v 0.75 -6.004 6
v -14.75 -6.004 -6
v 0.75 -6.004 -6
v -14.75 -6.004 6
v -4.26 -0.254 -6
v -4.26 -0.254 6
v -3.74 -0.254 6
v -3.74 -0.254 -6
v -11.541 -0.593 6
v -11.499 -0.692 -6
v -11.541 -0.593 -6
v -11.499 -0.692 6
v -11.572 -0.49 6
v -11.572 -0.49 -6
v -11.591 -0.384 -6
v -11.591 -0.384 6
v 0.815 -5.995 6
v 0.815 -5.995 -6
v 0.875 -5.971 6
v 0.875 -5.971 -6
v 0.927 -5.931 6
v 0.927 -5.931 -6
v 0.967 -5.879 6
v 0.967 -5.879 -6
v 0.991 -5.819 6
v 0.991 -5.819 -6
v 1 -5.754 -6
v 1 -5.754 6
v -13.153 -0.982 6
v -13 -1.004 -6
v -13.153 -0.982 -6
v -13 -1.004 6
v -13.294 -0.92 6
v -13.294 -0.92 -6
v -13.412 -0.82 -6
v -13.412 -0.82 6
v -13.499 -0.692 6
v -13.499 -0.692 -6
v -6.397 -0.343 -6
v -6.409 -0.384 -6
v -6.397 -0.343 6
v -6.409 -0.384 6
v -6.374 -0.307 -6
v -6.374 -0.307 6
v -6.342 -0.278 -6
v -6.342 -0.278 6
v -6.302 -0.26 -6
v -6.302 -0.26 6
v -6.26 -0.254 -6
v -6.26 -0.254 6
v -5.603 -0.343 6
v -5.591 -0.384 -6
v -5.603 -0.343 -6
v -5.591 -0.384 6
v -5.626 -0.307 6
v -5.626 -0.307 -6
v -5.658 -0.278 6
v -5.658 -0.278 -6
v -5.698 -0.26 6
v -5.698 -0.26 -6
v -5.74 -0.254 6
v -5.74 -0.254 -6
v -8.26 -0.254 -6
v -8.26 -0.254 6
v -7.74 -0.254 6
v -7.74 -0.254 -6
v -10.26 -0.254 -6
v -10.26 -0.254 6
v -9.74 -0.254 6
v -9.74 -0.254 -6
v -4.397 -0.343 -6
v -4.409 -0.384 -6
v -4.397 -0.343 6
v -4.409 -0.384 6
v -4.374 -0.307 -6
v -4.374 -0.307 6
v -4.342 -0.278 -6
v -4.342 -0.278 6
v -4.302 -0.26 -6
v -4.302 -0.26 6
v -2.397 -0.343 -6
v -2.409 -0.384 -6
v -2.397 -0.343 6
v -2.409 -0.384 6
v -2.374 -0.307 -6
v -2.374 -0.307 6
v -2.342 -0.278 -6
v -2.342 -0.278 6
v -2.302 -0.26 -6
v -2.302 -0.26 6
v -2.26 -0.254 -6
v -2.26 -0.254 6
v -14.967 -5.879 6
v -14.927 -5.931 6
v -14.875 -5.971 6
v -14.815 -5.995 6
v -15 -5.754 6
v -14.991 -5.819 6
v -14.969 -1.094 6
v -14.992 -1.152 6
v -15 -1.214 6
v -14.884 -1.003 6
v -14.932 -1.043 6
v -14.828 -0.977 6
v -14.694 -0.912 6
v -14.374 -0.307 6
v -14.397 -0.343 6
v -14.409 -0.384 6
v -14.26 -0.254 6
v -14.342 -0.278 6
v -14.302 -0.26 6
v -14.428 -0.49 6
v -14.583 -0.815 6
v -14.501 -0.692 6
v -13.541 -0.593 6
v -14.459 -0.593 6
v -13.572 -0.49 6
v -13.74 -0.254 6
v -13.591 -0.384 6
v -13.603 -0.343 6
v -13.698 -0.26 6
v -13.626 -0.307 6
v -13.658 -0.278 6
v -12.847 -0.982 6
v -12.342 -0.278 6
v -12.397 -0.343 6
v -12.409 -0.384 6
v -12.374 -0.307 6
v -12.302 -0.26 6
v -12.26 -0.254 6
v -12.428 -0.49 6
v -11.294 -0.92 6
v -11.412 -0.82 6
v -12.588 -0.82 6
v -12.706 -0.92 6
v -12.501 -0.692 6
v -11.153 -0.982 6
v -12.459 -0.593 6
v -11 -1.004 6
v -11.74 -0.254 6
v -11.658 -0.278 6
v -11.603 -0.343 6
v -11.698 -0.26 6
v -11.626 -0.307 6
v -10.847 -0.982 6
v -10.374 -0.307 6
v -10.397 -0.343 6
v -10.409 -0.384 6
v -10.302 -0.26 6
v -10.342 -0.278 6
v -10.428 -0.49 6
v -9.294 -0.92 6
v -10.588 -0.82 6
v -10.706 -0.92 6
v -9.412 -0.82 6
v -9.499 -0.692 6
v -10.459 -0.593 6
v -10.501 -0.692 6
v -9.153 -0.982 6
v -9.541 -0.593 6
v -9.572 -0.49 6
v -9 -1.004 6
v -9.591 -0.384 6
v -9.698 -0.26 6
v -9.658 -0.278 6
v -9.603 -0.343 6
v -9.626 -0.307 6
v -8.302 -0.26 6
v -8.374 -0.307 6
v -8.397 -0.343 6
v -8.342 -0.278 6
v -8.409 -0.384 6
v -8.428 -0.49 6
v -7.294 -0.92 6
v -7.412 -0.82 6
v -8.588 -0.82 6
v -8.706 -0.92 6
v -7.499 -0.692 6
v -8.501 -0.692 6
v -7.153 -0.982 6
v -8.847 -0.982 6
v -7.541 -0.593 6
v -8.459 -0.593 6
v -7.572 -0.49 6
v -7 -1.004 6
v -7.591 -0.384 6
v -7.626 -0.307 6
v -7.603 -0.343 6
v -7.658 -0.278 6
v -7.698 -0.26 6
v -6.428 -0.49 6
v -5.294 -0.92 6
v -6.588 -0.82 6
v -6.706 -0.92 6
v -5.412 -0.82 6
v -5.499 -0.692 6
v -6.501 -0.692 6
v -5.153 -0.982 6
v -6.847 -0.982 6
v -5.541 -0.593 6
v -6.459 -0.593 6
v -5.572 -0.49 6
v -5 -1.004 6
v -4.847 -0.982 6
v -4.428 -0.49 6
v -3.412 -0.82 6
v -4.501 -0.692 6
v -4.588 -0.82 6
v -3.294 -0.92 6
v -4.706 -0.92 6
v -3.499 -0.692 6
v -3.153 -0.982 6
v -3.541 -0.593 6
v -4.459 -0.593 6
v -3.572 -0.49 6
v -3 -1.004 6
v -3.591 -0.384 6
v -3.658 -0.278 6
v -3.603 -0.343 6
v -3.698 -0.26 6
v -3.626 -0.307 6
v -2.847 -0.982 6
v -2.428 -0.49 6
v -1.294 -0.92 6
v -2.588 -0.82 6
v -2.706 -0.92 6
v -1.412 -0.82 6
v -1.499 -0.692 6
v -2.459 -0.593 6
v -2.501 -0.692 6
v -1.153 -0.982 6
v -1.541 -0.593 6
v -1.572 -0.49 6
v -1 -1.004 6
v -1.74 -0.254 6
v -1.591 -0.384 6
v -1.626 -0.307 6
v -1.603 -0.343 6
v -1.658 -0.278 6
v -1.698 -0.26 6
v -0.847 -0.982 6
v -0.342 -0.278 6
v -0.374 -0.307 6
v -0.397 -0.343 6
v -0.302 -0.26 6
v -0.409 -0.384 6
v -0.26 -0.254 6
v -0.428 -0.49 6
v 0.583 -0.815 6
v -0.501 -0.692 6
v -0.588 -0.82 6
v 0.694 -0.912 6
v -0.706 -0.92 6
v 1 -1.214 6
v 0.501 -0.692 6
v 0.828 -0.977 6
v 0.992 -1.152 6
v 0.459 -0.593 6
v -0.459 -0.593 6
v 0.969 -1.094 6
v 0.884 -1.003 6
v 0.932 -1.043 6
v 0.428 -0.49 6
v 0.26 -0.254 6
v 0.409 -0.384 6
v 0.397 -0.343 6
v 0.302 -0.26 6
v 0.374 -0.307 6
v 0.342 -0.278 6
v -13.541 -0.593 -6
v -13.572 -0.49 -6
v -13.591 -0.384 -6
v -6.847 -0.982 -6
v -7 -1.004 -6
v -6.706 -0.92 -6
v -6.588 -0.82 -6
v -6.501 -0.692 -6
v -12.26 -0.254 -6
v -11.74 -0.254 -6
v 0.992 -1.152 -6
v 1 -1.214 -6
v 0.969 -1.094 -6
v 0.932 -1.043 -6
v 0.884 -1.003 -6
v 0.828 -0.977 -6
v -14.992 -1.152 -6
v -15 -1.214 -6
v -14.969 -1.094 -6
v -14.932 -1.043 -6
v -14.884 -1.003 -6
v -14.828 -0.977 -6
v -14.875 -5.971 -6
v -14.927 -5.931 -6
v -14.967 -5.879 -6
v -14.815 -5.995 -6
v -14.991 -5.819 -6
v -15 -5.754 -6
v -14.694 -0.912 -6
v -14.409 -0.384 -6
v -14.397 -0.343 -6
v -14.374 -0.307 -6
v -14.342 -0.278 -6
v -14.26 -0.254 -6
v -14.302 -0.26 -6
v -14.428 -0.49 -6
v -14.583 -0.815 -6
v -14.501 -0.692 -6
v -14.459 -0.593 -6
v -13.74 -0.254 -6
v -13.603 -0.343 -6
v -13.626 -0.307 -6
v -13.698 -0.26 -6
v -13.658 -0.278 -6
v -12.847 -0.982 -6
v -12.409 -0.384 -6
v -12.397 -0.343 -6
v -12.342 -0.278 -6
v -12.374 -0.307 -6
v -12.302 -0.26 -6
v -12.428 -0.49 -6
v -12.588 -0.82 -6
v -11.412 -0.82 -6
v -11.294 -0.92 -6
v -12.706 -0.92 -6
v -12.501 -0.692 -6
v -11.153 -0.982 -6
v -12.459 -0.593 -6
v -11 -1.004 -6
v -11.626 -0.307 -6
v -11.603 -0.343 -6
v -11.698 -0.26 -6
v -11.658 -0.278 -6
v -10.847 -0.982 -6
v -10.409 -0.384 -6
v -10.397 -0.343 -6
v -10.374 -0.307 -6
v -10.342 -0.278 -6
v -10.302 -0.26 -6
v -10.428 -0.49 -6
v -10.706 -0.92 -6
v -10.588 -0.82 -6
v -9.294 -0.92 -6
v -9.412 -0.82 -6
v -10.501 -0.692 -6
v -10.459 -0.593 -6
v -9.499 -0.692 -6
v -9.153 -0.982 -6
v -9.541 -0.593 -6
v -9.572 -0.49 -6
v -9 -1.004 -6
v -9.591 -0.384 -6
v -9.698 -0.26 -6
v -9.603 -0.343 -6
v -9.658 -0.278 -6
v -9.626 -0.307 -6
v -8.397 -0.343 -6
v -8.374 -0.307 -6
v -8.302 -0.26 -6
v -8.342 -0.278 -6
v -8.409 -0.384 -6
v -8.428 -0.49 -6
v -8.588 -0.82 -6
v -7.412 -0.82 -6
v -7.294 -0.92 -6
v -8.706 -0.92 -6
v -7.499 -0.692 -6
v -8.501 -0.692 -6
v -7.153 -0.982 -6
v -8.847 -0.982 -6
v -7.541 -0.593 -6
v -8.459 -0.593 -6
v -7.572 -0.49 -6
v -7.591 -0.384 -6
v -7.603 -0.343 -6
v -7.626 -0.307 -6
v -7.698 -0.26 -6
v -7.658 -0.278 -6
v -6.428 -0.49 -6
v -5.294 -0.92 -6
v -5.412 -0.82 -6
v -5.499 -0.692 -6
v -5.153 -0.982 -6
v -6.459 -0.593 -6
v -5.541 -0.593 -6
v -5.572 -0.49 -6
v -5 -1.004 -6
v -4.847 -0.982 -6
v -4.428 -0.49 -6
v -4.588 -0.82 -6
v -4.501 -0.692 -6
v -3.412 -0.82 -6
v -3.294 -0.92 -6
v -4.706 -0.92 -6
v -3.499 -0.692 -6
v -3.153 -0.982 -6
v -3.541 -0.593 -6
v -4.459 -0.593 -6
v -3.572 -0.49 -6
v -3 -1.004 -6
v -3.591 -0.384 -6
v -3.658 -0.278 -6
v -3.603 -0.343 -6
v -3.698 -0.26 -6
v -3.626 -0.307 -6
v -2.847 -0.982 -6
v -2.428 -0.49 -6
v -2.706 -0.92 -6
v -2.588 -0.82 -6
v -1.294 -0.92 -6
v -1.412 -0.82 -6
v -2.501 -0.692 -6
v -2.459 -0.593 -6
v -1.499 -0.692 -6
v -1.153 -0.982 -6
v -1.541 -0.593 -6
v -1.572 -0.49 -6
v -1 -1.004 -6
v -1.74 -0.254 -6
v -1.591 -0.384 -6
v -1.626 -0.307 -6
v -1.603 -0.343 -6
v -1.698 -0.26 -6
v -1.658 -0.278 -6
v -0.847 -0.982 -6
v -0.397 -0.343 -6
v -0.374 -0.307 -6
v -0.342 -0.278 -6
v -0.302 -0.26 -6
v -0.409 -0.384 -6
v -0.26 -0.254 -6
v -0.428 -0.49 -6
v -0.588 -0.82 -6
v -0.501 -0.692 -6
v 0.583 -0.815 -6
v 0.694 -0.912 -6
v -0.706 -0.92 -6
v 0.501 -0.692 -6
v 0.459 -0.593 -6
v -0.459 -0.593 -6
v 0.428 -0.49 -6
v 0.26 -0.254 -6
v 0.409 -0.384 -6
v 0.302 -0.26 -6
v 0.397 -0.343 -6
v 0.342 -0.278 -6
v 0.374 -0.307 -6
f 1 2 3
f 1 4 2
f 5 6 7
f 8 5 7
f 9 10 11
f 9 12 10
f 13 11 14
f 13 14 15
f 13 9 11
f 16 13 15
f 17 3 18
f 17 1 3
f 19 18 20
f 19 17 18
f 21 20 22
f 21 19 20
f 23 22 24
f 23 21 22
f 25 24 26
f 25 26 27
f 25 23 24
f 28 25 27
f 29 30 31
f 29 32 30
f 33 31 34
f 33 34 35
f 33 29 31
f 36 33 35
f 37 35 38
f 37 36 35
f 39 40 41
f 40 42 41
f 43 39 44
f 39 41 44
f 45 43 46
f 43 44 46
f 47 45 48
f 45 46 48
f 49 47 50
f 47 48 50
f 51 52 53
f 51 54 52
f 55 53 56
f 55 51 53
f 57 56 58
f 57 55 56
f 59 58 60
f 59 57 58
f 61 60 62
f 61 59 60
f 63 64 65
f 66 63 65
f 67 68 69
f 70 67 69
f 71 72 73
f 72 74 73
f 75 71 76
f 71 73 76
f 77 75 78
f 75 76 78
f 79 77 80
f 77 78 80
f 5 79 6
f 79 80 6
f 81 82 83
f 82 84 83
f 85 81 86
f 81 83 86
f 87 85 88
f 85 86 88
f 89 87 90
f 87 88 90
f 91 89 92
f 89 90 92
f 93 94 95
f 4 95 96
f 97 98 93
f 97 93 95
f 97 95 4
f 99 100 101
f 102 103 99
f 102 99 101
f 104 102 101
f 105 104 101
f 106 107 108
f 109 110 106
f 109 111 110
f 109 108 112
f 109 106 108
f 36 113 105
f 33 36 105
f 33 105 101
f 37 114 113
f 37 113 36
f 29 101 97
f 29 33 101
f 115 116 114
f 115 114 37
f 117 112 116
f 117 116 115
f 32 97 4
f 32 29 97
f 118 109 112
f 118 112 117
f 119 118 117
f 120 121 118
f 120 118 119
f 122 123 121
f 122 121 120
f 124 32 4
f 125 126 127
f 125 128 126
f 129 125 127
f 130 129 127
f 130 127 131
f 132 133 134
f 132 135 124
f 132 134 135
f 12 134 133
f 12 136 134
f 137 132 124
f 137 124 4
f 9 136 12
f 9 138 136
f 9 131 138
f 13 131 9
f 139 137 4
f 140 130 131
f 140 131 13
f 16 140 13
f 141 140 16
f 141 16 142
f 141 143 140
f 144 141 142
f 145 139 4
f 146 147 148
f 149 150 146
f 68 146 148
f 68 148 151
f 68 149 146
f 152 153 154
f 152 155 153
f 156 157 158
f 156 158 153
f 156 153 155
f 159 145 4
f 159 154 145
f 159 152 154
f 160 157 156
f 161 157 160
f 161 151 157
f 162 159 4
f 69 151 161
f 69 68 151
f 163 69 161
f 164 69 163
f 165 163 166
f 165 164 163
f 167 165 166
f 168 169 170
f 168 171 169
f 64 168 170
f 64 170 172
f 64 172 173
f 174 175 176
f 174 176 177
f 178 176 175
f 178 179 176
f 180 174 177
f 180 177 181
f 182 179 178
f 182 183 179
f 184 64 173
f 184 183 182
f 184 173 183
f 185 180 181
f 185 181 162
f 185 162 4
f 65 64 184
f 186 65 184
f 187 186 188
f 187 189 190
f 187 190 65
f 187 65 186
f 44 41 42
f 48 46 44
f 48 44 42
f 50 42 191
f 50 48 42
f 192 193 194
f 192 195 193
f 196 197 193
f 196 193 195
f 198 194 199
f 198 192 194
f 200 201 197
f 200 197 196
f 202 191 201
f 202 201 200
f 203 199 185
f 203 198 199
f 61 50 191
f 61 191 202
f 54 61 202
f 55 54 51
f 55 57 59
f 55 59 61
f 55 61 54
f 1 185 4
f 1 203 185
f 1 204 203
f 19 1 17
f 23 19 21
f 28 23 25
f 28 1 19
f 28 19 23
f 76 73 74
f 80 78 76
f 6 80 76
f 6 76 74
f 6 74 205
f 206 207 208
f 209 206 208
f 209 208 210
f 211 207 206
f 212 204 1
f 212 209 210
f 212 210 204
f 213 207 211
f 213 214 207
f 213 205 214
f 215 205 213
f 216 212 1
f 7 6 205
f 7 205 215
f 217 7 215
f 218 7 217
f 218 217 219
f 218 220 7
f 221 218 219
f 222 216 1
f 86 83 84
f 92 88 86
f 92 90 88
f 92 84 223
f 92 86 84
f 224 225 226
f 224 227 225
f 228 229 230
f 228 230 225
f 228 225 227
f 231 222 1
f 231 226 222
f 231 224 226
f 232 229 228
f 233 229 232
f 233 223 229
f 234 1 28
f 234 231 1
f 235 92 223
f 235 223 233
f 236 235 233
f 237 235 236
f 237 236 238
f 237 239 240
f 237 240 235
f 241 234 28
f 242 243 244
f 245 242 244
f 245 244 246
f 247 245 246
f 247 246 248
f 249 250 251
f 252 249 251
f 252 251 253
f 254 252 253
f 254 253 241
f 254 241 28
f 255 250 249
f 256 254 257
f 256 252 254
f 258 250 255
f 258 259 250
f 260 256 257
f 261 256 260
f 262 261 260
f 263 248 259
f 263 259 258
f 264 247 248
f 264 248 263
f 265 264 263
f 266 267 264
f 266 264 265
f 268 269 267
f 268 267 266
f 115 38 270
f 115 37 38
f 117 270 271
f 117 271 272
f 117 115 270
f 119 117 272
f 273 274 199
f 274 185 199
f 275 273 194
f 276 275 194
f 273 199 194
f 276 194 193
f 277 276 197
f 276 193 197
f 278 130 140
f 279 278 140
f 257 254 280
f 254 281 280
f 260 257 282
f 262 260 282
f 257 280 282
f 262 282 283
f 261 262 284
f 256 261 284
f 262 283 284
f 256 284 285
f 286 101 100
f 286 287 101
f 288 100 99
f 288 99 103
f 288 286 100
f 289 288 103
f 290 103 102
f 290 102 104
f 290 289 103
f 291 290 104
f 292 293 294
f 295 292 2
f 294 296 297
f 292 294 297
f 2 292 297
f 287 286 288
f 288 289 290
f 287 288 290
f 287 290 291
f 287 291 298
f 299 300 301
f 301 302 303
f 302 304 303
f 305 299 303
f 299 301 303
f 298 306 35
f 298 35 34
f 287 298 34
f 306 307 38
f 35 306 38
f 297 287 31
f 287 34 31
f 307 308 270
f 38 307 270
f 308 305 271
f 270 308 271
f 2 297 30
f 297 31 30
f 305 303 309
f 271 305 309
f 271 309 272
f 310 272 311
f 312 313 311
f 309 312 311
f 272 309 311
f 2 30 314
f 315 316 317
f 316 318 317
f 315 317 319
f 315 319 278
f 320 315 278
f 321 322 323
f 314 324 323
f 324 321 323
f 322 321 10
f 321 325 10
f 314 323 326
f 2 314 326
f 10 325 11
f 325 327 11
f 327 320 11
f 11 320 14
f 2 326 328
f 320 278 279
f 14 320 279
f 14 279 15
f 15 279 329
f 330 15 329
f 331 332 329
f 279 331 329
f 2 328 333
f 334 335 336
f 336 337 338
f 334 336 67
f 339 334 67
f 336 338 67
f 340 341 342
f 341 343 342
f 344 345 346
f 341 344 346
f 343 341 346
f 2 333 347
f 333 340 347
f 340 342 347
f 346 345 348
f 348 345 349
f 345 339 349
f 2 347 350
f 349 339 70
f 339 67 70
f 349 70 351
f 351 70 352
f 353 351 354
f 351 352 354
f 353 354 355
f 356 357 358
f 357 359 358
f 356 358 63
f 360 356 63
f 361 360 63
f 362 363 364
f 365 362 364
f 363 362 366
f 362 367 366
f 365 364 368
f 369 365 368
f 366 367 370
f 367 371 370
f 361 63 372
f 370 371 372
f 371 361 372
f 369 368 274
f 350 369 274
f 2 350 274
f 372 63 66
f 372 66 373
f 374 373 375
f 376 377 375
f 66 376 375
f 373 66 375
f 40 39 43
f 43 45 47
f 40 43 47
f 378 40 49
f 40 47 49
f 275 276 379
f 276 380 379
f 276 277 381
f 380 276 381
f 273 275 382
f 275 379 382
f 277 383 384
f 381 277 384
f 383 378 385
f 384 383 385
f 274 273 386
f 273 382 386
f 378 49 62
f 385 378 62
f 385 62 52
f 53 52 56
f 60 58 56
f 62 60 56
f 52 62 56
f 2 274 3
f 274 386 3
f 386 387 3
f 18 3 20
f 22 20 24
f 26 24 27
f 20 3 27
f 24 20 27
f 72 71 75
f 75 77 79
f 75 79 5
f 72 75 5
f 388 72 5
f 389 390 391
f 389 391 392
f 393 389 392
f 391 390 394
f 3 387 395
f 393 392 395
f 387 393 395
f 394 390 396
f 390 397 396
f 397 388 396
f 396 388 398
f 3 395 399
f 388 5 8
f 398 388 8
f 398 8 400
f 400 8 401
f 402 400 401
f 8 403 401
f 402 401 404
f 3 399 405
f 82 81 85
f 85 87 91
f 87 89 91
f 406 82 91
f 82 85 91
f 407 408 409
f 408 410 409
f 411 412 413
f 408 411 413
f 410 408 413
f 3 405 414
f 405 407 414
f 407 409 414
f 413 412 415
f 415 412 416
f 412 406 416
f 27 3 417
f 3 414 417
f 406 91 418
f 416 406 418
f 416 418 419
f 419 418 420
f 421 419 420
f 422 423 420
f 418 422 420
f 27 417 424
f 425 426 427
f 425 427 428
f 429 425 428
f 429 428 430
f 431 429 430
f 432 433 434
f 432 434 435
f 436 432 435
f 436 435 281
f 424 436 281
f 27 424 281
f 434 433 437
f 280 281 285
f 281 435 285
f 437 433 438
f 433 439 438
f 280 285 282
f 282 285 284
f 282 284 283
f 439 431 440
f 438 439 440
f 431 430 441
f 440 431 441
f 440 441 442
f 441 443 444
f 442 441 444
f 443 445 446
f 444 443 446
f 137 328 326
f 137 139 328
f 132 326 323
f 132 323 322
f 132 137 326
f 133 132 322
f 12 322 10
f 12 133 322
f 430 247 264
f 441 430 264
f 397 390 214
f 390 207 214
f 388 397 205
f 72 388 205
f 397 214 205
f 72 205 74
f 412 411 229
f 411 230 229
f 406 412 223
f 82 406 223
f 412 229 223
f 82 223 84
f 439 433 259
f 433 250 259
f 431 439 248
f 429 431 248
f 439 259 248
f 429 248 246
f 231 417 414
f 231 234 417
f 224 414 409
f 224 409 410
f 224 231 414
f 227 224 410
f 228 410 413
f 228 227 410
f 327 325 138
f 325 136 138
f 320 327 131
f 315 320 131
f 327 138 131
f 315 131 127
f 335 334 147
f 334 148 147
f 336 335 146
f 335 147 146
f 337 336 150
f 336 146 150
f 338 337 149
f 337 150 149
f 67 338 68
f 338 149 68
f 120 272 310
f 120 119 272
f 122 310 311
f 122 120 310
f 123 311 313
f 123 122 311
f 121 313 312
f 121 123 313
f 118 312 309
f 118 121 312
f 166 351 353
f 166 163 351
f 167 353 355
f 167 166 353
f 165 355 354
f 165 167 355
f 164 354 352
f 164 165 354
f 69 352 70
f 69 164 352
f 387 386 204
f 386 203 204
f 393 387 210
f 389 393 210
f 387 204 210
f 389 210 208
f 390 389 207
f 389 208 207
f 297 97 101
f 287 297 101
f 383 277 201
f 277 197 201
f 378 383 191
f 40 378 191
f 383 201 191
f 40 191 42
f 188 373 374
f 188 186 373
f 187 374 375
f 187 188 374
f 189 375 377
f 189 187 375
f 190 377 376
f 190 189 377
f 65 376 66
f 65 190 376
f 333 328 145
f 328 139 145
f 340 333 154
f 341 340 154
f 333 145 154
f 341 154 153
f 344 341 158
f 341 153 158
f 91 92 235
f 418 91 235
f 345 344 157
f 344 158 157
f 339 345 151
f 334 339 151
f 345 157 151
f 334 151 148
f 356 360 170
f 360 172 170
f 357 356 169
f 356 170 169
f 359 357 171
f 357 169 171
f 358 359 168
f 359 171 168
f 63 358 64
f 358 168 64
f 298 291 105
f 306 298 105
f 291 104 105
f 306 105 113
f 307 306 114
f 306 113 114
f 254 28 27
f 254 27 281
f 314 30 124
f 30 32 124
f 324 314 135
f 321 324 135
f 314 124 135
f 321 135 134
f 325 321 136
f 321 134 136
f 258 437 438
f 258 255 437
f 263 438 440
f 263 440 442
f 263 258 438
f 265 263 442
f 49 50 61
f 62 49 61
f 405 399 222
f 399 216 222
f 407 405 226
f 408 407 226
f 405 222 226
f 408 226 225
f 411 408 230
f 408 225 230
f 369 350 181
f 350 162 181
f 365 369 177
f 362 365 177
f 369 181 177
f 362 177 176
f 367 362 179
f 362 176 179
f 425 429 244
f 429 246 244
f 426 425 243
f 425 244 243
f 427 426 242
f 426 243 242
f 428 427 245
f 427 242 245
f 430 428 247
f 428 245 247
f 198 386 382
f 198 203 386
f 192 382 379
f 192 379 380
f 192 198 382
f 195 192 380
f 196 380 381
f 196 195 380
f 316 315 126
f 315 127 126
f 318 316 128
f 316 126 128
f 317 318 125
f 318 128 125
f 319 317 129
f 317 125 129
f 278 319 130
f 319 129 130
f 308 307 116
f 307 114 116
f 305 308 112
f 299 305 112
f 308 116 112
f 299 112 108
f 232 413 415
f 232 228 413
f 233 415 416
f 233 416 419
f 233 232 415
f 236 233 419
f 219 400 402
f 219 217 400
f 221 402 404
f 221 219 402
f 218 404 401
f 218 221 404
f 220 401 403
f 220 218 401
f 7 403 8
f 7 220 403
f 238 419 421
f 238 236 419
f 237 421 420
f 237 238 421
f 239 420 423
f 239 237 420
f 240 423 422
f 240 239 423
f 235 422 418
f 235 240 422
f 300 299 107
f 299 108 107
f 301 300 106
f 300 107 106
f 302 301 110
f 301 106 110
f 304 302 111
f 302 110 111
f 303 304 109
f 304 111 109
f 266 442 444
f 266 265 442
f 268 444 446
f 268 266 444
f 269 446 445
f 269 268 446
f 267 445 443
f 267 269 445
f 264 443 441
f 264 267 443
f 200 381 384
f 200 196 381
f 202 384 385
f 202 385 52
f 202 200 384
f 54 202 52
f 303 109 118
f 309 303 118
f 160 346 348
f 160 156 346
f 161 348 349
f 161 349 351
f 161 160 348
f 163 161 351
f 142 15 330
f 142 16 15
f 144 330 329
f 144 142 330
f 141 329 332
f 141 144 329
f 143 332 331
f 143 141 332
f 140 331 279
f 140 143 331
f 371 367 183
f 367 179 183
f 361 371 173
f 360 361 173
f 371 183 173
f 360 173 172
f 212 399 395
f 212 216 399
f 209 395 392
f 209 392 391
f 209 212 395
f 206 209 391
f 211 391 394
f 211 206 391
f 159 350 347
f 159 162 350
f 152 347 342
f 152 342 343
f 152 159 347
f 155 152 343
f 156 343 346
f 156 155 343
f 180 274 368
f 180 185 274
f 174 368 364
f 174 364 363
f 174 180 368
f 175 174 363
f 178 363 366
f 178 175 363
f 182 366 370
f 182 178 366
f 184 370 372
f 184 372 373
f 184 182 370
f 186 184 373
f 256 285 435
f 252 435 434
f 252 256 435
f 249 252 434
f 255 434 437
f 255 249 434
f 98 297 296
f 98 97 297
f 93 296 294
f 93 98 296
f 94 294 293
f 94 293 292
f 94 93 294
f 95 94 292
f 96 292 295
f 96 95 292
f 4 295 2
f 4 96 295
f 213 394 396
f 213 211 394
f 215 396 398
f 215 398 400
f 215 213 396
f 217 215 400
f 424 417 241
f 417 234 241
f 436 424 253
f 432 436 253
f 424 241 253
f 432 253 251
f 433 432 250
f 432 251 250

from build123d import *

# Parameters (mm, degrees)
BOSS_EXTRUDE1_DEPTH = 6
LPATTERN1_COUNT     = 8
LPATTERN1_PITCH     = 2
SKETCH4_W           = 16
SKETCH4_H           = 6.004
BOSS_EXTRUDE3_DEPTH = 6
FILLET1_R           = 0.25


with BuildPart() as part:
    # Sketch1 → Boss-Extrude1 (new, symmetric)
    with BuildSketch(Plane.XY):
        with BuildLine():
            Line((0, 0), (1, 0))
            Line((1, 0), (1, -1.004))
            ThreePointArc((1, -1.004), (0.705850588, -0.919639059), (0.501123596, -0.692202247))
            ThreePointArc((0.501123596, -0.692202247), (0.442388286, -0.542062154), (0.408543109, -0.384434783))
            ThreePointArc((0.408543109, -0.384434783), (0.358731646, -0.291228588), (0.259824575, -0.254))
            Line((0.259824575, -0.254), (0, -0.254))
            Line((0, -0.254), (0, 0))
        make_face()
    extrude(amount=BOSS_EXTRUDE1_DEPTH, both=True)

    # Mirror1: part across plane


with BuildPart() as part_1:
    add(part.part)
    add(part.part.mirror(Plane(origin=(0, 0, 6), x_dir=(0, 0, 1), z_dir=(1, 0, 0))))


with BuildPart() as lpattern1_1:
    # LPattern1: pattern copy
    add(part_1.part.moved(Location(Vector(-1, 0, 0) * (1 * LPATTERN1_PITCH))))


with BuildPart() as lpattern1_2:
    # LPattern1: pattern copy
    add(part_1.part.moved(Location(Vector(-1, 0, 0) * (2 * LPATTERN1_PITCH))))


with BuildPart() as lpattern1_3:
    # LPattern1: pattern copy
    add(part_1.part.moved(Location(Vector(-1, 0, 0) * (3 * LPATTERN1_PITCH))))


with BuildPart() as lpattern1_4:
    # LPattern1: pattern copy
    add(part_1.part.moved(Location(Vector(-1, 0, 0) * (4 * LPATTERN1_PITCH))))


with BuildPart() as lpattern1_5:
    # LPattern1: pattern copy
    add(part_1.part.moved(Location(Vector(-1, 0, 0) * (5 * LPATTERN1_PITCH))))


with BuildPart() as lpattern1_6:
    # LPattern1: pattern copy
    add(part_1.part.moved(Location(Vector(-1, 0, 0) * (6 * LPATTERN1_PITCH))))


with BuildPart() as lpattern1_7:
    # LPattern1: pattern copy
    add(part_1.part.moved(Location(Vector(-1, 0, 0) * (7 * LPATTERN1_PITCH))))


with BuildPart() as lpattern1_1_1:
    add(lpattern1_1.part)

    # Combine1: union LPattern1_4, part, LPattern1_3, LPattern1_2, LPattern1_5, LPattern1_6, LPattern1_7
    add(lpattern1_4.part)
    add(part_1.part)
    add(lpattern1_3.part)
    add(lpattern1_2.part)
    add(lpattern1_5.part)
    add(lpattern1_6.part)
    add(lpattern1_7.part)


with BuildPart() as body_2:
    # Sketch4 → Boss-Extrude3 (new, symmetric)
    with BuildSketch(Plane.XY):
        with Locations((-7, -3.002)):
            Rectangle(SKETCH4_W, SKETCH4_H)
    extrude(amount=BOSS_EXTRUDE3_DEPTH, both=True)

    # Combine2: cut LPattern1_1
    add(lpattern1_1_1.part, mode=Mode.SUBTRACT)

    # Fillet1
    fillet1_edges = [body_2.edges().sort_by_distance(p)[0] for p in [
        (-15, -1.004, 0),
        (1, -1.004, 0),
        (1, -6.004, 0),
        (-15, -6.004, 0),
    ]]
    fillet(fillet1_edges, radius=FILLET1_R)


solid = body_2.part
